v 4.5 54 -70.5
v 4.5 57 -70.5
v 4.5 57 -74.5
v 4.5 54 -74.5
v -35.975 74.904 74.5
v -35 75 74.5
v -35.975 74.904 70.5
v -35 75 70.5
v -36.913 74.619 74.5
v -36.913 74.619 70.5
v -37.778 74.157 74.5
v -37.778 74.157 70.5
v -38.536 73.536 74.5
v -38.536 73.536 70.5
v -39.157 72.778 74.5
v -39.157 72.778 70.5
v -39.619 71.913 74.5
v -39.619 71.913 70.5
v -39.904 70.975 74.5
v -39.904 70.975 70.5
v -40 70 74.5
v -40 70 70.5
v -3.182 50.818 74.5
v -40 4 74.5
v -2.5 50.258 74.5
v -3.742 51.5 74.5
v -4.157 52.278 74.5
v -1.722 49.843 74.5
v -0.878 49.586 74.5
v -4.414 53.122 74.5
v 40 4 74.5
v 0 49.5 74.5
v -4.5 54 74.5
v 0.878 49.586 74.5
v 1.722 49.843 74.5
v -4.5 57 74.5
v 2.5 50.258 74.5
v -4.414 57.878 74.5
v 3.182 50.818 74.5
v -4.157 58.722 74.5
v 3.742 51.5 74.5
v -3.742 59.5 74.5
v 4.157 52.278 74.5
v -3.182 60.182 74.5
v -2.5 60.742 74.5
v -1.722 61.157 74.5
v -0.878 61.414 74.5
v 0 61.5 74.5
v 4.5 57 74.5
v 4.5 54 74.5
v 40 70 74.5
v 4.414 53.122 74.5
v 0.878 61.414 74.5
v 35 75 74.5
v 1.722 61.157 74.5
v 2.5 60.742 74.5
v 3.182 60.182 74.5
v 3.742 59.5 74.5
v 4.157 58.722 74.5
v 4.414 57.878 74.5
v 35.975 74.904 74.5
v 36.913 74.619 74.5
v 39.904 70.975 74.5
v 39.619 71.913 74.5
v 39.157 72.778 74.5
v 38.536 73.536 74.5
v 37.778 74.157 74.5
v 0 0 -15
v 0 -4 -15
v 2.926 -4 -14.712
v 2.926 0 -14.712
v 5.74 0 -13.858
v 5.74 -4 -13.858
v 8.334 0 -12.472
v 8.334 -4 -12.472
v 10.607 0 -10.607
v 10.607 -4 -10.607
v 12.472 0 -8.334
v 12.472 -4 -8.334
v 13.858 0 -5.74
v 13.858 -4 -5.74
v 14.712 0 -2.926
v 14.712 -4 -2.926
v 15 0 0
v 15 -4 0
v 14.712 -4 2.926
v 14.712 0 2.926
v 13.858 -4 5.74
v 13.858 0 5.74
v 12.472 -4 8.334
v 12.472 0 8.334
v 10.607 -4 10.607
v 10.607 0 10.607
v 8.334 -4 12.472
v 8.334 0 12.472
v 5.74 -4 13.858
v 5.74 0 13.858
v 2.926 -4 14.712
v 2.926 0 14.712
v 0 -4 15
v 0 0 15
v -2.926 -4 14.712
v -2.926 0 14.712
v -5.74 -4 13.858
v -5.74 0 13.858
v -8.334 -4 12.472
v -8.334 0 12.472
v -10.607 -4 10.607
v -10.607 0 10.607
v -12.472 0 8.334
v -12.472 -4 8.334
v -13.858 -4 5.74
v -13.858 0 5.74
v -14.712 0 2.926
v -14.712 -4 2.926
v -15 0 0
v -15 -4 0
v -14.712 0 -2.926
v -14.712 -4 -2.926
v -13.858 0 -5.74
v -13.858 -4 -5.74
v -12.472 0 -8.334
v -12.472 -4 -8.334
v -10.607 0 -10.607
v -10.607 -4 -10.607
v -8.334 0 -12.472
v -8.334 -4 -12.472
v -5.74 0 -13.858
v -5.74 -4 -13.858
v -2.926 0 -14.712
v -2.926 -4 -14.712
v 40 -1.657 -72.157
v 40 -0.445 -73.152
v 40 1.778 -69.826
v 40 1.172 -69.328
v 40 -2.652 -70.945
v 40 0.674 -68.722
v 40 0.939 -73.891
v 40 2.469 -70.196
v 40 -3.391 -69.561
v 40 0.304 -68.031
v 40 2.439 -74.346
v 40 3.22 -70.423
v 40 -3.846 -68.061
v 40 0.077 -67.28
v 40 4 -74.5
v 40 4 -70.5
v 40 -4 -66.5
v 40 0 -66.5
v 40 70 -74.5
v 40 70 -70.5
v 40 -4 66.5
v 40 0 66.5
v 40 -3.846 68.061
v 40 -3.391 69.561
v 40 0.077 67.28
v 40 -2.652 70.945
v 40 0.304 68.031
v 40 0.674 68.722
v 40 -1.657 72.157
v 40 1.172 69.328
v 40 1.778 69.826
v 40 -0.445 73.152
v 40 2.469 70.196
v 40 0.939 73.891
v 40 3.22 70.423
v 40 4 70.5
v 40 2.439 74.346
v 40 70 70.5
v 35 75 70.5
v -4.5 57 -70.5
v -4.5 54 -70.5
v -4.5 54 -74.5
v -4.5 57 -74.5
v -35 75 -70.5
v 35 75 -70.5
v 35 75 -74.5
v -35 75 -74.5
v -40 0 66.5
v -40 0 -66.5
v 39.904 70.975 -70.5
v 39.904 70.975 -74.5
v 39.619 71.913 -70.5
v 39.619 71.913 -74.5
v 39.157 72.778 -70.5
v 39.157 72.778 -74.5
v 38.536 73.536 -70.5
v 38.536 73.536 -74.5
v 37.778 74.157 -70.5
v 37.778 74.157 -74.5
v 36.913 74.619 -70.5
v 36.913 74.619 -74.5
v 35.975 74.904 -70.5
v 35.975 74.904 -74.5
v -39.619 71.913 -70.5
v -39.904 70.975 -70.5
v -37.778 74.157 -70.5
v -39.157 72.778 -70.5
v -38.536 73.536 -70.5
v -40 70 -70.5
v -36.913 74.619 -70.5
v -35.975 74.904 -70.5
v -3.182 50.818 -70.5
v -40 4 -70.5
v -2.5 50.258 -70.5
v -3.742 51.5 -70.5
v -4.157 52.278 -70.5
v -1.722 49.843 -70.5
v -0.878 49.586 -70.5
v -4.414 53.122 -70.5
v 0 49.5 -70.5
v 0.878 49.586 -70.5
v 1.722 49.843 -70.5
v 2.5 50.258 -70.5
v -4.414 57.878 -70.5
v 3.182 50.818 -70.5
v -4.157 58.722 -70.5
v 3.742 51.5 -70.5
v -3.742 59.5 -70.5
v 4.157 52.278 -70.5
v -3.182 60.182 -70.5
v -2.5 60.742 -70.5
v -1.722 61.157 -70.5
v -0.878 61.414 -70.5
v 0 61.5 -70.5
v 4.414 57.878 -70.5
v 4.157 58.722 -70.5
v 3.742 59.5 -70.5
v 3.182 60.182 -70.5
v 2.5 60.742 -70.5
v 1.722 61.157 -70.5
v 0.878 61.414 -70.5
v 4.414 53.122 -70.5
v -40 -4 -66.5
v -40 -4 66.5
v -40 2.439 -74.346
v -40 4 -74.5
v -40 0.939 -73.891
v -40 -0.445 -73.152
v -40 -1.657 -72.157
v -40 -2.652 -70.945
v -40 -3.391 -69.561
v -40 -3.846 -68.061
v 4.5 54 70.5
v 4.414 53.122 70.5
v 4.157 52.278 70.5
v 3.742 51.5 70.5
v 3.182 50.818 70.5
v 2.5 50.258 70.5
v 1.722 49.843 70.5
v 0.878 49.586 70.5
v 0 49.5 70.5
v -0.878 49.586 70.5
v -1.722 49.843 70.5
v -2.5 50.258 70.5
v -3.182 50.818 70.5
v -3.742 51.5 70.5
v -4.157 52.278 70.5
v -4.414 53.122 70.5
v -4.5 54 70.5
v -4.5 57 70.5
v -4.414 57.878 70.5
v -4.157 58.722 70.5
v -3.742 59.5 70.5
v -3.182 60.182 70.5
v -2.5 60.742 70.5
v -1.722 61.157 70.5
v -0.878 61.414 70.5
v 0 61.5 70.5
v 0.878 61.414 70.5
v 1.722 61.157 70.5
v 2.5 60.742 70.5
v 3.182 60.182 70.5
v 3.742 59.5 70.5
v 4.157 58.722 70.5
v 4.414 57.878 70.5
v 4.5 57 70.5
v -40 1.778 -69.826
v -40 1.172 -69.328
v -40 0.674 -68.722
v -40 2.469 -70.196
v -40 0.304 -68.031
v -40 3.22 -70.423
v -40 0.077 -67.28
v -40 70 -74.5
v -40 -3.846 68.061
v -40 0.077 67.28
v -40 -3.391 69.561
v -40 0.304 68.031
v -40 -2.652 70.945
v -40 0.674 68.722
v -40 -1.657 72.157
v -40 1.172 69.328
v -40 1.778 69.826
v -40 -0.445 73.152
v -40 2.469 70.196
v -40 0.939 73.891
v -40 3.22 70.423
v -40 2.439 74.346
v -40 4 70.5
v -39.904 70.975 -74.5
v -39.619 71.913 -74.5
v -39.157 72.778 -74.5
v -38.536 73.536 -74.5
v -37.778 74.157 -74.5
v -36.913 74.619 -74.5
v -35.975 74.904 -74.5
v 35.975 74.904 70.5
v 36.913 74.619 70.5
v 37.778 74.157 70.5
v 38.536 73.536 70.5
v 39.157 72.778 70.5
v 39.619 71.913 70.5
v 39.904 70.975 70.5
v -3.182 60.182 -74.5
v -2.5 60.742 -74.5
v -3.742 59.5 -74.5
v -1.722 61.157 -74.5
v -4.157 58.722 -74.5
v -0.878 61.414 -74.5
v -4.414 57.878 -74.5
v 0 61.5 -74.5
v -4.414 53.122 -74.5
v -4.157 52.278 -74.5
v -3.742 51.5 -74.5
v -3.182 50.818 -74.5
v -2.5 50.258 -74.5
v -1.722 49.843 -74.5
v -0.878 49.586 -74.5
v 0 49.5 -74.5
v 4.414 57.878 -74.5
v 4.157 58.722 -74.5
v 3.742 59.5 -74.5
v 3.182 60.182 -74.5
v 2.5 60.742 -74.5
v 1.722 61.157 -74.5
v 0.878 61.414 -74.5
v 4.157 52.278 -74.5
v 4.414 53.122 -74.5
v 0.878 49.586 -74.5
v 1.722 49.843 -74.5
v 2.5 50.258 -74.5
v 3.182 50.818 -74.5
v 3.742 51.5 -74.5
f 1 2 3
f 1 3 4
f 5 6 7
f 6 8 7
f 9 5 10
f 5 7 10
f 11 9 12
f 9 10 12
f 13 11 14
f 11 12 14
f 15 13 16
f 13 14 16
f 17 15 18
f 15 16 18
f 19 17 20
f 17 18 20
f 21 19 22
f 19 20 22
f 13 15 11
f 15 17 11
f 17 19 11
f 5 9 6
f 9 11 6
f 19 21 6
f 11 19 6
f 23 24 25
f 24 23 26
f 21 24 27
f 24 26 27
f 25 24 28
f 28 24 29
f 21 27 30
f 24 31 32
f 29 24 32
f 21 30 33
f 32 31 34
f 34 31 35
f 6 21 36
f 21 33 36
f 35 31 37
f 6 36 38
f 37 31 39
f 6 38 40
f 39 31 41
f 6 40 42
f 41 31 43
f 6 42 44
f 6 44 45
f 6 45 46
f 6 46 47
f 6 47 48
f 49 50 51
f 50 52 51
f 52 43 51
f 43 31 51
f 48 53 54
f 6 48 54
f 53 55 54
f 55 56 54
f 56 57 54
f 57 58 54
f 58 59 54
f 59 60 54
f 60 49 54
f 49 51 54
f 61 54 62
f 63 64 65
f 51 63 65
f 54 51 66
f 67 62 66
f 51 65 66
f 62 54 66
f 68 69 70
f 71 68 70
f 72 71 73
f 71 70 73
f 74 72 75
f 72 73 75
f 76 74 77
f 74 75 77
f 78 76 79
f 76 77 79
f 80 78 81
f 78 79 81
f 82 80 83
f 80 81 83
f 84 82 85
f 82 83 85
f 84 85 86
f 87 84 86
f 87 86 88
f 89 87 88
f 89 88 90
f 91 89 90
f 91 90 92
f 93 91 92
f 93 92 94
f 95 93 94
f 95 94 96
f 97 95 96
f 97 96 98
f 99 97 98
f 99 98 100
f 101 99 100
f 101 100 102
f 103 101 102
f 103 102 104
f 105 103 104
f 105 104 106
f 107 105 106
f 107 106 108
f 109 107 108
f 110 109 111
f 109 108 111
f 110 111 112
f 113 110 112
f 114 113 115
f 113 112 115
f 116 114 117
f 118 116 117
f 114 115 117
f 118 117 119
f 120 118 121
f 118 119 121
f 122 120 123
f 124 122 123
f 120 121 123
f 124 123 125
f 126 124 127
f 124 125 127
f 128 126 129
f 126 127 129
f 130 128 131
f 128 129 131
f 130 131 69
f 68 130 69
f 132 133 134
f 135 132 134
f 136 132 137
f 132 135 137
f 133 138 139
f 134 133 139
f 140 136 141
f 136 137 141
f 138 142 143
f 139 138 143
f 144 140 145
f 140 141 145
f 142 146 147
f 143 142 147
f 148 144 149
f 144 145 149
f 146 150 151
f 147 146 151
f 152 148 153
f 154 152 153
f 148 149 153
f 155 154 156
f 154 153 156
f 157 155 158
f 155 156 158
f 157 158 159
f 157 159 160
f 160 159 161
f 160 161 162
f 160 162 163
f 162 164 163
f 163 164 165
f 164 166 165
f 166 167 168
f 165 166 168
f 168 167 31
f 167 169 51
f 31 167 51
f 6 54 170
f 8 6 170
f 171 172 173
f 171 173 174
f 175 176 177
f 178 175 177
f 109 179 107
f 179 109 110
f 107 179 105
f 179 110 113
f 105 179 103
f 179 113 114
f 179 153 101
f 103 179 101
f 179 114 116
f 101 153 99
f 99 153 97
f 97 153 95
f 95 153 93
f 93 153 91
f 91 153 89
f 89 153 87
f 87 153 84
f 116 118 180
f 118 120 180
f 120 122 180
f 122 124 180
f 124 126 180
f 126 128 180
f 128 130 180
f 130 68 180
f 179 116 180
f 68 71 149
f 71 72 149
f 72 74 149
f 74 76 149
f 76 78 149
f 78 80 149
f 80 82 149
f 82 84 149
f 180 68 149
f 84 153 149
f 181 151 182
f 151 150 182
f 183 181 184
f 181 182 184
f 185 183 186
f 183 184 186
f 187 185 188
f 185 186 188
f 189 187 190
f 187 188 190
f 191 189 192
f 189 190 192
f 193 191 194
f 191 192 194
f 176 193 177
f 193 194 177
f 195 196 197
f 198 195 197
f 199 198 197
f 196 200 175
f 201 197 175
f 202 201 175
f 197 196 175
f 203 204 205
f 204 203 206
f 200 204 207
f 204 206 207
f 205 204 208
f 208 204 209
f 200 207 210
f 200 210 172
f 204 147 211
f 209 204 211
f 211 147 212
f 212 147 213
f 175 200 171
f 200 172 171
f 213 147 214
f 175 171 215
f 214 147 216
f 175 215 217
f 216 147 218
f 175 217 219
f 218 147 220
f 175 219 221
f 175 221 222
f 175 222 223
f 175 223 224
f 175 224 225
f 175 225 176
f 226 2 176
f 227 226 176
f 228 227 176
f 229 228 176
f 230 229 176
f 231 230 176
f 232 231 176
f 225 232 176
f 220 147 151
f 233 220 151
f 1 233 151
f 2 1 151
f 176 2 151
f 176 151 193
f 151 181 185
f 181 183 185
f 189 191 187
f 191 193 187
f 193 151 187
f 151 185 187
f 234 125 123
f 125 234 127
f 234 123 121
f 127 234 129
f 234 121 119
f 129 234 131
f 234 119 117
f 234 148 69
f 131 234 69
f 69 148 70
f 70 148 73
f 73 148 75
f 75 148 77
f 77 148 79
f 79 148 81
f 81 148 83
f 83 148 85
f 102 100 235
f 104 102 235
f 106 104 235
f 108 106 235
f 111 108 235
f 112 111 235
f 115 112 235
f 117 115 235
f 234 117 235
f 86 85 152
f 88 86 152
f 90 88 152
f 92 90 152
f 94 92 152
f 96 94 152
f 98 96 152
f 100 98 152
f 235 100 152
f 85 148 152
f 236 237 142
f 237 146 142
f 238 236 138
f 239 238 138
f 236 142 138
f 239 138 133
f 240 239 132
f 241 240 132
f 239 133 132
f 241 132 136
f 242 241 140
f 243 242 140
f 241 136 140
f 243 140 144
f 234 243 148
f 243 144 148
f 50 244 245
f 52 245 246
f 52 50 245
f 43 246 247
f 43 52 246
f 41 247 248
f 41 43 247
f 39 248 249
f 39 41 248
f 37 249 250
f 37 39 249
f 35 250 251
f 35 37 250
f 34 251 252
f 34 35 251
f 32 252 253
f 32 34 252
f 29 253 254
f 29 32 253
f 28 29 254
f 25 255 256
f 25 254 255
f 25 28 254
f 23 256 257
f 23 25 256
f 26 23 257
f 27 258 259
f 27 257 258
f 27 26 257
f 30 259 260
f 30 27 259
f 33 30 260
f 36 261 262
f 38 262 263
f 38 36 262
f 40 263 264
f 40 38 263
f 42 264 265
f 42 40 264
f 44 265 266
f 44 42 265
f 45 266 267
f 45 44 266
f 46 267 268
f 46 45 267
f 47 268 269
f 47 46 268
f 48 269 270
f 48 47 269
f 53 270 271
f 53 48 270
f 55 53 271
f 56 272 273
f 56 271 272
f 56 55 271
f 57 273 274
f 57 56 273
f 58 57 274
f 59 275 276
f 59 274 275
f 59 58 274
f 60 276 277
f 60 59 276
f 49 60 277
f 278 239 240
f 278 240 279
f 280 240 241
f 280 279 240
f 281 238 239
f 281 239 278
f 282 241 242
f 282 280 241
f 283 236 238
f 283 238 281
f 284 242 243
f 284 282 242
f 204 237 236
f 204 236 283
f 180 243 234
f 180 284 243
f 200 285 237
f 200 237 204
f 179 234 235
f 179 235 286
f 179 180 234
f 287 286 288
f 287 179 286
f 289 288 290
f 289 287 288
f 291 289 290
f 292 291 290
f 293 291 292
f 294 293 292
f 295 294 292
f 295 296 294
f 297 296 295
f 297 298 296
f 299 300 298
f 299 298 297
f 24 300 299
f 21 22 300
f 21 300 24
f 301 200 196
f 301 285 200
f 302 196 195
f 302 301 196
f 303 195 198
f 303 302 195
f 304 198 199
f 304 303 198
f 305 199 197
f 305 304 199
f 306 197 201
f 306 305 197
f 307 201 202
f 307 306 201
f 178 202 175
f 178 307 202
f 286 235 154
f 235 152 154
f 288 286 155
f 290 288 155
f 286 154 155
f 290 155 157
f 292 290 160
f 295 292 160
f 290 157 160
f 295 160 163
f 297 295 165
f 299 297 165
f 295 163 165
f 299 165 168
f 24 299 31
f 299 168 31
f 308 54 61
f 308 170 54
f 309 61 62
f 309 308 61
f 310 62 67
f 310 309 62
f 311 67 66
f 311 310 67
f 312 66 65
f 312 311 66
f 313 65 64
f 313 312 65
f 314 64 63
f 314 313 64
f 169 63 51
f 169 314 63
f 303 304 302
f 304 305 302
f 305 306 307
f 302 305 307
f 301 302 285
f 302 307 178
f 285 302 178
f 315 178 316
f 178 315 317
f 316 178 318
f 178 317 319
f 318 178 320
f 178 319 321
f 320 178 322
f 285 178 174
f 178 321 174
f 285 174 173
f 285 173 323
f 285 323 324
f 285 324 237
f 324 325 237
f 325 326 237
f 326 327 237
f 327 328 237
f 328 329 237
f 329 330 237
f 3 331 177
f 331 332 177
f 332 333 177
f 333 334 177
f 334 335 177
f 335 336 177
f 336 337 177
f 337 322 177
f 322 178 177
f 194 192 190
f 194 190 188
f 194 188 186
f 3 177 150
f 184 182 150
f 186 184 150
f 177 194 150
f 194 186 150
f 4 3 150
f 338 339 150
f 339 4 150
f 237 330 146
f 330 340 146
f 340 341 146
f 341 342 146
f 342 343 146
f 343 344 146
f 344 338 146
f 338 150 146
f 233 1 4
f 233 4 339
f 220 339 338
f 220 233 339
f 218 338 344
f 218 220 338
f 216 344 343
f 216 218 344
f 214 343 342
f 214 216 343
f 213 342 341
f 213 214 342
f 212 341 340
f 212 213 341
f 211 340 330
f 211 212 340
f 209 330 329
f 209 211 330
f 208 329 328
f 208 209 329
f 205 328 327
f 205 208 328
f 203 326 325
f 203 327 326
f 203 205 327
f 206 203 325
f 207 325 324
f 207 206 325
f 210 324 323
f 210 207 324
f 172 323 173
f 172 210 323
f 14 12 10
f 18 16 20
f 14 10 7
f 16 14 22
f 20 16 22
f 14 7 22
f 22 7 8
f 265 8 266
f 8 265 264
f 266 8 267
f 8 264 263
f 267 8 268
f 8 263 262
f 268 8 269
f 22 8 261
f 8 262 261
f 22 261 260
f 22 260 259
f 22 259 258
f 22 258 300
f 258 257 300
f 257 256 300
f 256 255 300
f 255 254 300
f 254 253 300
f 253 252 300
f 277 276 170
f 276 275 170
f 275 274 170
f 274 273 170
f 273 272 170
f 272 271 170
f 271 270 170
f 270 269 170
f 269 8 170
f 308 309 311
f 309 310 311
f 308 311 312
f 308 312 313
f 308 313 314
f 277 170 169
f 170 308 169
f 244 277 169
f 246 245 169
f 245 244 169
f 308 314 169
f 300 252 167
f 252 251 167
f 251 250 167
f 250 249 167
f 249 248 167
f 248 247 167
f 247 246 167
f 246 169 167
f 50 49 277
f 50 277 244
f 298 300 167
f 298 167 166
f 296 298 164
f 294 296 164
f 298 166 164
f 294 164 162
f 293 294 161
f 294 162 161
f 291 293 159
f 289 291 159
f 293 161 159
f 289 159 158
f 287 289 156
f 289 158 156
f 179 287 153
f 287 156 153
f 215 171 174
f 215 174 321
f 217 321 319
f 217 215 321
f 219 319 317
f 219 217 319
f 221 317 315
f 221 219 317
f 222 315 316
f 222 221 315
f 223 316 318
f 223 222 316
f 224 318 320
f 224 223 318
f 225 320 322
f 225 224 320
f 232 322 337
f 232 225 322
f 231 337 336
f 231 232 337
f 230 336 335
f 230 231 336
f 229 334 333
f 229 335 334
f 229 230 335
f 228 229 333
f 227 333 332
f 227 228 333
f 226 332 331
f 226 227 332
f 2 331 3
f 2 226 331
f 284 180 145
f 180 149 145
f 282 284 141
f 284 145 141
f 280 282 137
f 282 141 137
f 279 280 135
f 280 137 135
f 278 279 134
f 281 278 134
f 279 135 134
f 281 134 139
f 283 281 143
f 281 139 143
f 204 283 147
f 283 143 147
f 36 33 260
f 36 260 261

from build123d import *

# Parameters (mm, degrees)
SM_BASE_FLANGE_1_DEPTH = 40
CUT_EXTRUDE_1_REACH    = 117.721
SKETCH_6_R             = 15
CUT_EXTRUDE_2_DEPTH    = 172.54008278
FILLET_1_R             = 5


# Sheet-metal steps are written as plain solids
with BuildPart() as part:
    # Sketch 1 → 基体-法兰1 (new, symmetric)
    with BuildSketch(Plane(origin=(0, 0, 0), x_dir=(0, 0, -1), z_dir=(1, 0, 0))):
        with BuildLine():
            Line((-70.5, 75), (-70.5, 4))
            ThreePointArc((-70.5, 4), (-69.328427125, 1.171572875), (-66.5, 0))
            Line((-66.5, 0), (66.5, 0))
            ThreePointArc((66.5, 0), (69.328427125, 1.171572875), (70.5, 4))
            Line((70.5, 4), (70.5, 75))
            Line((70.5, 75), (74.5, 75))
            Line((74.5, 75), (74.5, 4))
            ThreePointArc((74.5, 4), (72.156854249, -1.656854249), (66.5, -4))
            Line((66.5, -4), (-66.5, -4))
            ThreePointArc((-66.5, -4), (-72.156854249, -1.656854249), (-74.5, 4))
            Line((-74.5, 4), (-74.5, 75))
            Line((-74.5, 75), (-70.5, 75))
        make_face()
    extrude(amount=SM_BASE_FLANGE_1_DEPTH, both=True)

    # 草图6 → 切除-拉伸1 (cut, up to next)
    with BuildSketch(Plane.XZ.offset(4), mode=Mode.PRIVATE) as cut_extrude_1_sk1:
        with Locations(Location((0, 0, 0), (0, 0, 270))):
            Circle(SKETCH_6_R)
    cut_extrude_1_tool1 = extrude(cut_extrude_1_sk1.sketch, amount=-CUT_EXTRUDE_1_REACH, mode=Mode.PRIVATE) & part.part
    add(cut_extrude_1_tool1.solids().sort_by_distance((0, -4, 0))[0], mode=Mode.SUBTRACT)

    # 草图7 → 切除-拉伸2 (cut, through all)
    with BuildSketch(Plane.XY.offset(74.5)):
        with BuildLine():
            Line((4.5, 57), (4.5, 54))
            ThreePointArc((4.5, 54), (0, 49.5), (-4.5, 54))
            Line((-4.5, 54), (-4.5, 57))
            ThreePointArc((-4.5, 57), (0, 61.5), (4.5, 57))
        make_face()
    extrude(amount=-CUT_EXTRUDE_2_DEPTH, mode=Mode.SUBTRACT)

    # 圆角1
    fillet_1_edges = [part.edges().sort_by_distance(p)[0] for p in [
        (-40, 75, 72.5),
        (-40, 75, -72.5),
        (40, 75, 72.5),
        (40, 75, -72.5),
    ]]
    fillet(fillet_1_edges, radius=FILLET_1_R)


solid = part.part
